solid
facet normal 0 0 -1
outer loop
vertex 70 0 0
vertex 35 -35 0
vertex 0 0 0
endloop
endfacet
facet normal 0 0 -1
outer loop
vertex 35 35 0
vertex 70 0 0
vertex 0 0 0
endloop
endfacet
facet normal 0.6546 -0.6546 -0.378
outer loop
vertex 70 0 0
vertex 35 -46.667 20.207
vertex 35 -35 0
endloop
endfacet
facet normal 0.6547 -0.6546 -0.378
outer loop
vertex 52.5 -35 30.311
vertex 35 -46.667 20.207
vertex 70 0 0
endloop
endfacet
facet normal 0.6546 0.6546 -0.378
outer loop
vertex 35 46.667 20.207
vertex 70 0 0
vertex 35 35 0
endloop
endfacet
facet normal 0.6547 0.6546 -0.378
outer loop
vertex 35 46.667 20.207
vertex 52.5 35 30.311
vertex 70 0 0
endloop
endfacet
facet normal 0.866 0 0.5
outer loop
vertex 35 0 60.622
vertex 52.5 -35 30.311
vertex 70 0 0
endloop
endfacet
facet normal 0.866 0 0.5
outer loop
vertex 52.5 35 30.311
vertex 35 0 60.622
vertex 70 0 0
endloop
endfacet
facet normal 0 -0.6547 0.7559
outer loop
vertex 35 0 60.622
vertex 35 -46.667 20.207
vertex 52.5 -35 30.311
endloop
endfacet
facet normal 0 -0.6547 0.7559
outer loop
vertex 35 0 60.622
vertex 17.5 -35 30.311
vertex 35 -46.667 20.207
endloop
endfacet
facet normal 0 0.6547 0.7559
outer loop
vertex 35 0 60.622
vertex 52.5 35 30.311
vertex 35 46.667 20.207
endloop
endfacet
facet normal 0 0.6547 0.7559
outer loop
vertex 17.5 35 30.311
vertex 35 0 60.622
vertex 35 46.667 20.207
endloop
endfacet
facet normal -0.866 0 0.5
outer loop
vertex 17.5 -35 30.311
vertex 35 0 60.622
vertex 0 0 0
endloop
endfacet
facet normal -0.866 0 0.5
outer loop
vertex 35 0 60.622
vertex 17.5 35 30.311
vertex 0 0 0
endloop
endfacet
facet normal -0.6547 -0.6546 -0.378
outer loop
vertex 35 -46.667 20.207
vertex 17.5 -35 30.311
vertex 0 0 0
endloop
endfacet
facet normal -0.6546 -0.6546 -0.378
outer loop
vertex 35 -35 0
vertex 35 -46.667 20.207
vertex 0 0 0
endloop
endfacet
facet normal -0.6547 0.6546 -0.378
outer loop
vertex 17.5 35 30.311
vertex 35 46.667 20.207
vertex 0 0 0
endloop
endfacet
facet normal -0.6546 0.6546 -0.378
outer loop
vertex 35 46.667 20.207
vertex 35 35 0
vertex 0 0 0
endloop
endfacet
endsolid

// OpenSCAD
// A Perfect Herschel enneahedron
//
// Bill Owens, Feb 2014
//   released into the public domain
//
// This is an OpenSCAD model of the Herschel enneahedron created by Christian Perfect <http://checkmyworking.com/>
// Full description and a paper model at <http://aperiodical.com/2013/10/an-enneahedron-for-herschel/>
//
// Setting size=70 and stretch=1 produces a model the same size and proportion as the paper model in the original article.

// parameters for Thingiverse Customizer
//

// tip-to-tip length (mm)
size = 70;	

// shape of the polyhedron
stretch = 1;

/* [Hidden] */
h1 = stretch/2;
h2 = stretch*2/3;

scale(size) rotate([90,0,0]) polyhedron(
    points = [
    [1/2,0,-h1],    		//v0
    [0,0,0],					//v1
    [1/2,0,h1],				//v2
    [1,0,0],					//v3
    [1/2,sqrt(3)/6,-h2],		//v4
    [3/4,sqrt(3)/4,-h1],		//v5
    [3/4,sqrt(3)/4,h1],		//v6
    [1/2,sqrt(3)/6,h2],		//v7
    [1/4,sqrt(3)/4,h1],		//v8
    [1/4,sqrt(3)/4,-h1],		//v9
    [1/2,sqrt(3)/2,0]],		//v10
    triangles = [
    [1,2,3],
    [1,3,0],
    [2,7,3],
    [3,7,6],
    [0,3,4],
    [3,5,4],
    [3,6,10],
    [3,10,5],
    [6,7,10],
    [7,8,10],
    [4,5,10],
    [4,10,9],
    [1,10,8],
    [1,9,10],
    [1,8,7],
    [1,7,2],
    [1,4,9],
    [1,0,4]]);
